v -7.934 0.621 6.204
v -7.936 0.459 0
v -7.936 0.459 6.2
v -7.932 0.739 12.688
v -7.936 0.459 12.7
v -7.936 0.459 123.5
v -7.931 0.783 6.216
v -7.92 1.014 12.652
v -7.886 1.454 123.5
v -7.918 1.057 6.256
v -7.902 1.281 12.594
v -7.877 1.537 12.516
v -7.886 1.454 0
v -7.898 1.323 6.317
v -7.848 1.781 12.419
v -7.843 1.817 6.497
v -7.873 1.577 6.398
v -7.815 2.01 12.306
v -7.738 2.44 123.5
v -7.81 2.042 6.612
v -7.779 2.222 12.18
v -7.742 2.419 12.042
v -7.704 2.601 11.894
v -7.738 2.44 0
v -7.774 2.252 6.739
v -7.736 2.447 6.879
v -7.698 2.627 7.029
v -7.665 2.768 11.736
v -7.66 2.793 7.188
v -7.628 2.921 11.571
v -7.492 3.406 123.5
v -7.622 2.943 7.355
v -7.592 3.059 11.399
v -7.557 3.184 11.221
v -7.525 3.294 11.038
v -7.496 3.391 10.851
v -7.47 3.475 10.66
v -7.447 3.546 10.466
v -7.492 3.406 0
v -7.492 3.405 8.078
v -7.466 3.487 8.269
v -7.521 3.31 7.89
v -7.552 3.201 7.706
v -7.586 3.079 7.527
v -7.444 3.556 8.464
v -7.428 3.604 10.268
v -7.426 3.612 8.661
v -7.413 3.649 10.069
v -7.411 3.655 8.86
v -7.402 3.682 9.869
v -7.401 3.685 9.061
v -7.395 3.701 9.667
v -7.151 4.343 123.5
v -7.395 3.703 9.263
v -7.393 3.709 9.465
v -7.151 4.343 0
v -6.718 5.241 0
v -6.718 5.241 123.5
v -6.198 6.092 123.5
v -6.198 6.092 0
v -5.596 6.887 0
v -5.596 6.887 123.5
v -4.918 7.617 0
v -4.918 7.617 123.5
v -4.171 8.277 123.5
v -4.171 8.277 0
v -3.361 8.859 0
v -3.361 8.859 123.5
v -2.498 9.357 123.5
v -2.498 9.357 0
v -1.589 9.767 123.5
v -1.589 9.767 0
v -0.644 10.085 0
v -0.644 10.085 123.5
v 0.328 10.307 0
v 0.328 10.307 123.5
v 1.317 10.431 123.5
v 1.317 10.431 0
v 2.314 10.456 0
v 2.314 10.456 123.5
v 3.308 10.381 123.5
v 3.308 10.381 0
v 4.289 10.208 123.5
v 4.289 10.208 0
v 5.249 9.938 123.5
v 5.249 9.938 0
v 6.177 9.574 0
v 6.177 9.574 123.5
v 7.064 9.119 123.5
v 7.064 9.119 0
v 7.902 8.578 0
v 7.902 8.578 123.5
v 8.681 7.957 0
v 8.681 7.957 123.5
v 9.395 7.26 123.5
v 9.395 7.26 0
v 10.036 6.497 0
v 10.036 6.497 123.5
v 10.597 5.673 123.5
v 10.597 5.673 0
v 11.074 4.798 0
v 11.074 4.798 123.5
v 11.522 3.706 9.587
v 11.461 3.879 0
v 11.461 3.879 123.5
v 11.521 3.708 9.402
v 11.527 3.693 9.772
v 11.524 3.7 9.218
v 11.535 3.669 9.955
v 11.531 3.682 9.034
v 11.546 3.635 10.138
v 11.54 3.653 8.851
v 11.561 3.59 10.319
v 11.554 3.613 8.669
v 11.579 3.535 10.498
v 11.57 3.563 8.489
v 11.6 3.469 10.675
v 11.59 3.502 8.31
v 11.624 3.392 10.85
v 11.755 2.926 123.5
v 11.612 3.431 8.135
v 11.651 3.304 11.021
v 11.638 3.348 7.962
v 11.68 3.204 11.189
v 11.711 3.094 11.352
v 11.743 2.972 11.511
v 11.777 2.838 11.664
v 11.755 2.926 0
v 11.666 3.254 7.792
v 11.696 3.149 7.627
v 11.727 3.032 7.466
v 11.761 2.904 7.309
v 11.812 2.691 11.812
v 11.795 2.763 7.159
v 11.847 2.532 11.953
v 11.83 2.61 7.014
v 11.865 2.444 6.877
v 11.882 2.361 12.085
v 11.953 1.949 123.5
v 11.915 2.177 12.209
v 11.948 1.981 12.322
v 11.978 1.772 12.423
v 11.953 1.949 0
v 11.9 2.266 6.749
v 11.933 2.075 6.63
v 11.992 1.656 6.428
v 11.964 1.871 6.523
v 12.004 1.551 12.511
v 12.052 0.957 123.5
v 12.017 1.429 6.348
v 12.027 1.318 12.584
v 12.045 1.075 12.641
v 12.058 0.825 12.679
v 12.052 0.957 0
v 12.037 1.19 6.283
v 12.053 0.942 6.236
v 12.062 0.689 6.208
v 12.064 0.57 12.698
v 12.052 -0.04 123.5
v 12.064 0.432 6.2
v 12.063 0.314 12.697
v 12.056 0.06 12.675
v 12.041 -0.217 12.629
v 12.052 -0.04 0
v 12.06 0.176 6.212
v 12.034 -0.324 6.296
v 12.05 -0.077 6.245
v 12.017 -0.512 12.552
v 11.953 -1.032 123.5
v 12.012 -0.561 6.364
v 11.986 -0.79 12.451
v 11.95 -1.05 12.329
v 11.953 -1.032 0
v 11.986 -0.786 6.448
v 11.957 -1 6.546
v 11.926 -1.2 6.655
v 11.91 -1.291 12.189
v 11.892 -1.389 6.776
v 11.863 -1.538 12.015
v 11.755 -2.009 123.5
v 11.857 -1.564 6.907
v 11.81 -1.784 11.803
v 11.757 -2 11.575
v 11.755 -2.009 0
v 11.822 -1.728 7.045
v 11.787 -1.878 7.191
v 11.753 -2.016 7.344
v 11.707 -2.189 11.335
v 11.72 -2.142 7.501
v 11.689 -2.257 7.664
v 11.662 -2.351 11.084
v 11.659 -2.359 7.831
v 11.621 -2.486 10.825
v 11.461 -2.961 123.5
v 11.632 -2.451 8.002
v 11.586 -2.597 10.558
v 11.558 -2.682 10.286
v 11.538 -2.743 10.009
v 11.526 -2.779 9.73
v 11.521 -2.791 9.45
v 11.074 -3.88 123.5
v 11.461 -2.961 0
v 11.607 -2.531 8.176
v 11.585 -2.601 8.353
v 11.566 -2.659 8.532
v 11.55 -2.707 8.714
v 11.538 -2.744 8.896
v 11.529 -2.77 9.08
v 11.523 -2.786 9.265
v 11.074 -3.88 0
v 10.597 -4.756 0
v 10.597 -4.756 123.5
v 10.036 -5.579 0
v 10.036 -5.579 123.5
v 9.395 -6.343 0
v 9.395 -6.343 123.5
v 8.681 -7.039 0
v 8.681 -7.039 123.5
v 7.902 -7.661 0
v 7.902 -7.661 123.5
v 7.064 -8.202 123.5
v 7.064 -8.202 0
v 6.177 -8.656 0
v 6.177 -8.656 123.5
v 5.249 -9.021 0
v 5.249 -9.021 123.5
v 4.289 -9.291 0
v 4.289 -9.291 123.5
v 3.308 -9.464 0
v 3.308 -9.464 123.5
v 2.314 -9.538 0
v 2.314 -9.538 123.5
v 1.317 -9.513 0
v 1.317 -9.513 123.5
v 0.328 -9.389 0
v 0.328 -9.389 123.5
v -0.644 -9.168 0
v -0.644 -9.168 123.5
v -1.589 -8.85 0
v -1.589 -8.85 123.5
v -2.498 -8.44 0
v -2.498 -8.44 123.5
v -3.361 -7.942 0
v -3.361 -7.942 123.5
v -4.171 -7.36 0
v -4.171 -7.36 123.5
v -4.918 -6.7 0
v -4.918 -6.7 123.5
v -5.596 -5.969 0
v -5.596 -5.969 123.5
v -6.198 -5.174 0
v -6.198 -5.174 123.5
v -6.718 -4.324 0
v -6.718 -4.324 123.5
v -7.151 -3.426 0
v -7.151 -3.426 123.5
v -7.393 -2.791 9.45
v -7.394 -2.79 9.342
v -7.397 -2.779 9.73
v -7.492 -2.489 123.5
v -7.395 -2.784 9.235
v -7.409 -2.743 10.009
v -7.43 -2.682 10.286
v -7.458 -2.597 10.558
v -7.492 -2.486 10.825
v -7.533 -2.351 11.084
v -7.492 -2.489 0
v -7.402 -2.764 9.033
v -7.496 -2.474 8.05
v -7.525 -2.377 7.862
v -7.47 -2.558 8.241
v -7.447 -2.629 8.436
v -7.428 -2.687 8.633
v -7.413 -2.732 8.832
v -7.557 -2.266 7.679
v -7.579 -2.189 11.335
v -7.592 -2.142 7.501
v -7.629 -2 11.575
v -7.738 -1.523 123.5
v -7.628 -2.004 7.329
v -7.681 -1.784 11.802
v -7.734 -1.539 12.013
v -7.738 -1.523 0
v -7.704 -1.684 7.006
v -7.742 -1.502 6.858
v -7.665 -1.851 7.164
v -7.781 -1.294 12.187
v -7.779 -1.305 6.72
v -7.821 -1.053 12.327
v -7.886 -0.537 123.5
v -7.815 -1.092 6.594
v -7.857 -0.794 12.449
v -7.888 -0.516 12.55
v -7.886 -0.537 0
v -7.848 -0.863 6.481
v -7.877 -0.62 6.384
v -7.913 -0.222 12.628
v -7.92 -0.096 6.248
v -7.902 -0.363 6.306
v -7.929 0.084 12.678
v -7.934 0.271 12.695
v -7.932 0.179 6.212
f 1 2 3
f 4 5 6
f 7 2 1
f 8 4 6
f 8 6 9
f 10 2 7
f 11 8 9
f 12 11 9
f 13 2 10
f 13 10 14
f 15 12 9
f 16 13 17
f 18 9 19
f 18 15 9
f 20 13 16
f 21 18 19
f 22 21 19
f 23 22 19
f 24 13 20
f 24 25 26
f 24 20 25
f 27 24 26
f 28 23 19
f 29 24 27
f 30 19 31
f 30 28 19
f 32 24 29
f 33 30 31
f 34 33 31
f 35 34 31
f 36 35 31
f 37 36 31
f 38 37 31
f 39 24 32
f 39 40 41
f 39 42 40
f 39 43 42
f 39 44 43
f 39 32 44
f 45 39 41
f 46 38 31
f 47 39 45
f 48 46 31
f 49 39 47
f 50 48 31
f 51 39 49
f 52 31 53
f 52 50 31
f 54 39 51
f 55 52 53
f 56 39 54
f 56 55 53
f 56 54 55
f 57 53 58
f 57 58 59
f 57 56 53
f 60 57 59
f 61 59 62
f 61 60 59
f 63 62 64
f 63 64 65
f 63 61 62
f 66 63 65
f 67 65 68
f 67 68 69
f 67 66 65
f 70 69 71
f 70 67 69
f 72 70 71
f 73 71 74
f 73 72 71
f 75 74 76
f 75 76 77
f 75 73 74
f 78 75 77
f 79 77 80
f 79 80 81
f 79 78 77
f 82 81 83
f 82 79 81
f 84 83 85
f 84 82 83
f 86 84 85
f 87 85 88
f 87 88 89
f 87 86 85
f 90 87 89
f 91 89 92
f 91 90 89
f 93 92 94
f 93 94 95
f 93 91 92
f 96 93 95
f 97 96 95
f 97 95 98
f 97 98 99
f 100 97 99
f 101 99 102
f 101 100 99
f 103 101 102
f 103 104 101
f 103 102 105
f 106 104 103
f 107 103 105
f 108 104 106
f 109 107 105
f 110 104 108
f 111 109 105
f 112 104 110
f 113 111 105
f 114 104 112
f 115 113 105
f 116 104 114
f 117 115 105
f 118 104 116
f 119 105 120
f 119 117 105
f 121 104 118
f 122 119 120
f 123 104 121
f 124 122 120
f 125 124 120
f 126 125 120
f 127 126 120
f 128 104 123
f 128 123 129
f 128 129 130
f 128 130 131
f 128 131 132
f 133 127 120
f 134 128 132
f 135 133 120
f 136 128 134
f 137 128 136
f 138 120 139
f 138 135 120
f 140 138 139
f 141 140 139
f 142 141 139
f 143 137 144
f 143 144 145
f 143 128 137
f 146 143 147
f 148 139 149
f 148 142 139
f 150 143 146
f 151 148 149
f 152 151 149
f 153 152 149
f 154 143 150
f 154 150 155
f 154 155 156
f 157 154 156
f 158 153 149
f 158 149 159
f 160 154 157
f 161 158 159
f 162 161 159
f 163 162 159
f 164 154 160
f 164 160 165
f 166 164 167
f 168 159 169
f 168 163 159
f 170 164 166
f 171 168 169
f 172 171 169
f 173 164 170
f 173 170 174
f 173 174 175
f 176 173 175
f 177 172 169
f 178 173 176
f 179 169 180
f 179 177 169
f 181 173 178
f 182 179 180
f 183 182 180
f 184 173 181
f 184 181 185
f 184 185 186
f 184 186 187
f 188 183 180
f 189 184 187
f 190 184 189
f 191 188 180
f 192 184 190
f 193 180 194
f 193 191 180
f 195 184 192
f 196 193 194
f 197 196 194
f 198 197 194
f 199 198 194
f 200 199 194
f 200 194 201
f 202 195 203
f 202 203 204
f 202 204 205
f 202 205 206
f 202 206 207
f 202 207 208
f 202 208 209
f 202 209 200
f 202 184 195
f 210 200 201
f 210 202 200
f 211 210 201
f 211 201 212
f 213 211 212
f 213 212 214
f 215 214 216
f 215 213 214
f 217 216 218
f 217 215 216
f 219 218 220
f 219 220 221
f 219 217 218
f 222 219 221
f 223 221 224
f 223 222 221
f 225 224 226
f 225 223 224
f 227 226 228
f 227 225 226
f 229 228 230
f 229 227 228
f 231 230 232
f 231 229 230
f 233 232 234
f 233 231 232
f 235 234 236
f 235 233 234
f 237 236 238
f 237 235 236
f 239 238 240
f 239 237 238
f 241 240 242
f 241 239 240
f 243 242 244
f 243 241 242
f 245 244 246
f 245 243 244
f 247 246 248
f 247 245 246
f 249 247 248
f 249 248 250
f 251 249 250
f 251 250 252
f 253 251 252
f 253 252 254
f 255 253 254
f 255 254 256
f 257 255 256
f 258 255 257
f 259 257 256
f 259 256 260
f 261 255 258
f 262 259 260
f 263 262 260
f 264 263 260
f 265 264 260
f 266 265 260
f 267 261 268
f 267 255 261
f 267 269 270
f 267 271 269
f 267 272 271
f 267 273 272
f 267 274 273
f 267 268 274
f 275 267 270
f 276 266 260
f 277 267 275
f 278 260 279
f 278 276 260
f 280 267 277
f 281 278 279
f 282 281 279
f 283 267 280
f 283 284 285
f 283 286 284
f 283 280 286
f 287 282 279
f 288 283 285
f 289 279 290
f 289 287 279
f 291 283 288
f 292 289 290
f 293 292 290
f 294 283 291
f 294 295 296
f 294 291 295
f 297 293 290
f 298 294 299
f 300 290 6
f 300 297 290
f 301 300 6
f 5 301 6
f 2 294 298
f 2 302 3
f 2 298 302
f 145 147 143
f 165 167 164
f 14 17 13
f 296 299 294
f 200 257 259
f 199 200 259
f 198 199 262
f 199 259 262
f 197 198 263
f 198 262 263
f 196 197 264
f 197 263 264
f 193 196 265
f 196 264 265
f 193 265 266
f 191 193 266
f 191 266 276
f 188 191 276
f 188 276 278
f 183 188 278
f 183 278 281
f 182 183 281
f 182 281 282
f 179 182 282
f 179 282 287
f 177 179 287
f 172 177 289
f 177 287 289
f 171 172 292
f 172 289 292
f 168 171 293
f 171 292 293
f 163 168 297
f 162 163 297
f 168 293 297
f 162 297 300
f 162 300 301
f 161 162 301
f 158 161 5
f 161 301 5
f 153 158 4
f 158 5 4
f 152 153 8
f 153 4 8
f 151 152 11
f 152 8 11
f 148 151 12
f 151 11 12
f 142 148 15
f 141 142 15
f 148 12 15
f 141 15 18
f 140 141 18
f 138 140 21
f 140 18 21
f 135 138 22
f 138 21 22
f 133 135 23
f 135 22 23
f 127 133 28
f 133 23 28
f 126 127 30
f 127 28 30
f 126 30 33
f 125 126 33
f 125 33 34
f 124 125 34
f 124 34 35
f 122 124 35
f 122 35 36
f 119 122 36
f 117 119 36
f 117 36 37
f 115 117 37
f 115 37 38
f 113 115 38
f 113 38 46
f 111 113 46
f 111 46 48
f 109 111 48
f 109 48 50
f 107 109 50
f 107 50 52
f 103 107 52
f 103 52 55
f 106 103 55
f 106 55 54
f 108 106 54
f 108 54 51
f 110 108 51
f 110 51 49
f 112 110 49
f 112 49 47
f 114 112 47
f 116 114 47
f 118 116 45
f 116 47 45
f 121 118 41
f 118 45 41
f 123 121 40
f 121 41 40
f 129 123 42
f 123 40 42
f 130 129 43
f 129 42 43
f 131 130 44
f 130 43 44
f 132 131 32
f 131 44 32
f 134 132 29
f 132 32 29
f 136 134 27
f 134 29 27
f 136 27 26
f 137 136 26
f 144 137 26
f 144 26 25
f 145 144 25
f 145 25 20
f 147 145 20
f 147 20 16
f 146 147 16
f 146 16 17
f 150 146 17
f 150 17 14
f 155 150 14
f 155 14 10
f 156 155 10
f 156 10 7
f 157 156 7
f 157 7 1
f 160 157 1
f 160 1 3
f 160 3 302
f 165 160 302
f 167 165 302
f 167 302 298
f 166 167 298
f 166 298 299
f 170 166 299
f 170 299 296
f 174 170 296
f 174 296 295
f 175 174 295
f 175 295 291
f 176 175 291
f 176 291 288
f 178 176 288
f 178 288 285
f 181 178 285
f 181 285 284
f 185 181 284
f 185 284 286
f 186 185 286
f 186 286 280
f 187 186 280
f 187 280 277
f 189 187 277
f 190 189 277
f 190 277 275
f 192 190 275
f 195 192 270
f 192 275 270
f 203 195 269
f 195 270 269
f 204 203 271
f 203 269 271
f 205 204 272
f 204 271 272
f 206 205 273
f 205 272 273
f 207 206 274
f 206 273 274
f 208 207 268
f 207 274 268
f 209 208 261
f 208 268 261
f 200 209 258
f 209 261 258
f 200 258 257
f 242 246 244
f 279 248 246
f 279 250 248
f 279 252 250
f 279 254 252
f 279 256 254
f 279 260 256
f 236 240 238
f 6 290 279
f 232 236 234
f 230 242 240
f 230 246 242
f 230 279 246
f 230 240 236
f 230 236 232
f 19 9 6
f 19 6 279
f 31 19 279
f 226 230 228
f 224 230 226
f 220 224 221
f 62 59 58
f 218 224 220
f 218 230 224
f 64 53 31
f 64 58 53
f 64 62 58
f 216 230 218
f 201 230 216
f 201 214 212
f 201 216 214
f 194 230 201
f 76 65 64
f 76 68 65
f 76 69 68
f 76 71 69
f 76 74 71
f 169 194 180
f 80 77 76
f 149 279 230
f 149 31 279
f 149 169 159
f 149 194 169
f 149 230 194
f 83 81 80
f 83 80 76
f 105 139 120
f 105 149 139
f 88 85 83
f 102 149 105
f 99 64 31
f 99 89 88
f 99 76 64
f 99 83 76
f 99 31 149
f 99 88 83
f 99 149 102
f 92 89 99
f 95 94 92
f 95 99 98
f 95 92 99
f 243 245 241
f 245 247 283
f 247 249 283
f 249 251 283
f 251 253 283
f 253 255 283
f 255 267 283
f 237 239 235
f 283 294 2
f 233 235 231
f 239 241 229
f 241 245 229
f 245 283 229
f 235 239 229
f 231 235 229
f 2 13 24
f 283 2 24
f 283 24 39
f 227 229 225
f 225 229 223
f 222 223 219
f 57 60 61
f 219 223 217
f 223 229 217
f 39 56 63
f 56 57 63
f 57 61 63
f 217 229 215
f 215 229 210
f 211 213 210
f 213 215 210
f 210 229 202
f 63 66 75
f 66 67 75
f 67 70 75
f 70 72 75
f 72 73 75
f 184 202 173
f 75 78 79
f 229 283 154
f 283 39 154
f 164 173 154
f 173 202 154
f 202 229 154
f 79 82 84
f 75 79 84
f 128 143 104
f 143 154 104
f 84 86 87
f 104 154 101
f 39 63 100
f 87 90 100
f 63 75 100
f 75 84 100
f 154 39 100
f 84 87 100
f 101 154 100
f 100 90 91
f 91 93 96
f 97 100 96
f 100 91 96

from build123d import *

# Parameters (mm, degrees)
SKETCH1_W           = 50
SKETCH1_H           = 50
BOSS_EXTRUDE1_DEPTH = 123.5
SKETCH2_R           = 3.25
CUT_EXTRUDE1_DEPTH  = 50
SKETCH3_OUTSIDE_W   = 80.462
SKETCH3_OUTSIDE_H   = 80.462
SKETCH3_OUTSIDE_R   = 10
CUT_EXTRUDE2_DEPTH  = 123.5


with BuildPart() as part:
    # Sketch1 → Boss-Extrude1 (new body)
    with BuildSketch(Plane.XY):
        with Locations((2.064220183, 0.458715596)):
            Rectangle(SKETCH1_W, SKETCH1_H)
    extrude(amount=BOSS_EXTRUDE1_DEPTH)

    # Sketch2 → Cut-Extrude1 (cut)
    with BuildSketch(Plane.ZY.offset(22.935779817)):
        with Locations((9.45, 0.458715596)):
            Circle(SKETCH2_R)
    extrude(amount=-CUT_EXTRUDE1_DEPTH, mode=Mode.SUBTRACT)

    # Sketch3 outside → Cut-Extrude2 (cut)
    with BuildSketch(Plane(origin=(0, 0, 0), x_dir=(-1, 0, 0), z_dir=(0, 0, -1))):
        with Locations((-2.064, 0.459)):
            Rectangle(SKETCH3_OUTSIDE_W, SKETCH3_OUTSIDE_H)
        with Locations((-2.064220183, 0.458715596)):
            Circle(SKETCH3_OUTSIDE_R, mode=Mode.SUBTRACT)
    extrude(amount=-CUT_EXTRUDE2_DEPTH, mode=Mode.SUBTRACT)


solid = part.part
